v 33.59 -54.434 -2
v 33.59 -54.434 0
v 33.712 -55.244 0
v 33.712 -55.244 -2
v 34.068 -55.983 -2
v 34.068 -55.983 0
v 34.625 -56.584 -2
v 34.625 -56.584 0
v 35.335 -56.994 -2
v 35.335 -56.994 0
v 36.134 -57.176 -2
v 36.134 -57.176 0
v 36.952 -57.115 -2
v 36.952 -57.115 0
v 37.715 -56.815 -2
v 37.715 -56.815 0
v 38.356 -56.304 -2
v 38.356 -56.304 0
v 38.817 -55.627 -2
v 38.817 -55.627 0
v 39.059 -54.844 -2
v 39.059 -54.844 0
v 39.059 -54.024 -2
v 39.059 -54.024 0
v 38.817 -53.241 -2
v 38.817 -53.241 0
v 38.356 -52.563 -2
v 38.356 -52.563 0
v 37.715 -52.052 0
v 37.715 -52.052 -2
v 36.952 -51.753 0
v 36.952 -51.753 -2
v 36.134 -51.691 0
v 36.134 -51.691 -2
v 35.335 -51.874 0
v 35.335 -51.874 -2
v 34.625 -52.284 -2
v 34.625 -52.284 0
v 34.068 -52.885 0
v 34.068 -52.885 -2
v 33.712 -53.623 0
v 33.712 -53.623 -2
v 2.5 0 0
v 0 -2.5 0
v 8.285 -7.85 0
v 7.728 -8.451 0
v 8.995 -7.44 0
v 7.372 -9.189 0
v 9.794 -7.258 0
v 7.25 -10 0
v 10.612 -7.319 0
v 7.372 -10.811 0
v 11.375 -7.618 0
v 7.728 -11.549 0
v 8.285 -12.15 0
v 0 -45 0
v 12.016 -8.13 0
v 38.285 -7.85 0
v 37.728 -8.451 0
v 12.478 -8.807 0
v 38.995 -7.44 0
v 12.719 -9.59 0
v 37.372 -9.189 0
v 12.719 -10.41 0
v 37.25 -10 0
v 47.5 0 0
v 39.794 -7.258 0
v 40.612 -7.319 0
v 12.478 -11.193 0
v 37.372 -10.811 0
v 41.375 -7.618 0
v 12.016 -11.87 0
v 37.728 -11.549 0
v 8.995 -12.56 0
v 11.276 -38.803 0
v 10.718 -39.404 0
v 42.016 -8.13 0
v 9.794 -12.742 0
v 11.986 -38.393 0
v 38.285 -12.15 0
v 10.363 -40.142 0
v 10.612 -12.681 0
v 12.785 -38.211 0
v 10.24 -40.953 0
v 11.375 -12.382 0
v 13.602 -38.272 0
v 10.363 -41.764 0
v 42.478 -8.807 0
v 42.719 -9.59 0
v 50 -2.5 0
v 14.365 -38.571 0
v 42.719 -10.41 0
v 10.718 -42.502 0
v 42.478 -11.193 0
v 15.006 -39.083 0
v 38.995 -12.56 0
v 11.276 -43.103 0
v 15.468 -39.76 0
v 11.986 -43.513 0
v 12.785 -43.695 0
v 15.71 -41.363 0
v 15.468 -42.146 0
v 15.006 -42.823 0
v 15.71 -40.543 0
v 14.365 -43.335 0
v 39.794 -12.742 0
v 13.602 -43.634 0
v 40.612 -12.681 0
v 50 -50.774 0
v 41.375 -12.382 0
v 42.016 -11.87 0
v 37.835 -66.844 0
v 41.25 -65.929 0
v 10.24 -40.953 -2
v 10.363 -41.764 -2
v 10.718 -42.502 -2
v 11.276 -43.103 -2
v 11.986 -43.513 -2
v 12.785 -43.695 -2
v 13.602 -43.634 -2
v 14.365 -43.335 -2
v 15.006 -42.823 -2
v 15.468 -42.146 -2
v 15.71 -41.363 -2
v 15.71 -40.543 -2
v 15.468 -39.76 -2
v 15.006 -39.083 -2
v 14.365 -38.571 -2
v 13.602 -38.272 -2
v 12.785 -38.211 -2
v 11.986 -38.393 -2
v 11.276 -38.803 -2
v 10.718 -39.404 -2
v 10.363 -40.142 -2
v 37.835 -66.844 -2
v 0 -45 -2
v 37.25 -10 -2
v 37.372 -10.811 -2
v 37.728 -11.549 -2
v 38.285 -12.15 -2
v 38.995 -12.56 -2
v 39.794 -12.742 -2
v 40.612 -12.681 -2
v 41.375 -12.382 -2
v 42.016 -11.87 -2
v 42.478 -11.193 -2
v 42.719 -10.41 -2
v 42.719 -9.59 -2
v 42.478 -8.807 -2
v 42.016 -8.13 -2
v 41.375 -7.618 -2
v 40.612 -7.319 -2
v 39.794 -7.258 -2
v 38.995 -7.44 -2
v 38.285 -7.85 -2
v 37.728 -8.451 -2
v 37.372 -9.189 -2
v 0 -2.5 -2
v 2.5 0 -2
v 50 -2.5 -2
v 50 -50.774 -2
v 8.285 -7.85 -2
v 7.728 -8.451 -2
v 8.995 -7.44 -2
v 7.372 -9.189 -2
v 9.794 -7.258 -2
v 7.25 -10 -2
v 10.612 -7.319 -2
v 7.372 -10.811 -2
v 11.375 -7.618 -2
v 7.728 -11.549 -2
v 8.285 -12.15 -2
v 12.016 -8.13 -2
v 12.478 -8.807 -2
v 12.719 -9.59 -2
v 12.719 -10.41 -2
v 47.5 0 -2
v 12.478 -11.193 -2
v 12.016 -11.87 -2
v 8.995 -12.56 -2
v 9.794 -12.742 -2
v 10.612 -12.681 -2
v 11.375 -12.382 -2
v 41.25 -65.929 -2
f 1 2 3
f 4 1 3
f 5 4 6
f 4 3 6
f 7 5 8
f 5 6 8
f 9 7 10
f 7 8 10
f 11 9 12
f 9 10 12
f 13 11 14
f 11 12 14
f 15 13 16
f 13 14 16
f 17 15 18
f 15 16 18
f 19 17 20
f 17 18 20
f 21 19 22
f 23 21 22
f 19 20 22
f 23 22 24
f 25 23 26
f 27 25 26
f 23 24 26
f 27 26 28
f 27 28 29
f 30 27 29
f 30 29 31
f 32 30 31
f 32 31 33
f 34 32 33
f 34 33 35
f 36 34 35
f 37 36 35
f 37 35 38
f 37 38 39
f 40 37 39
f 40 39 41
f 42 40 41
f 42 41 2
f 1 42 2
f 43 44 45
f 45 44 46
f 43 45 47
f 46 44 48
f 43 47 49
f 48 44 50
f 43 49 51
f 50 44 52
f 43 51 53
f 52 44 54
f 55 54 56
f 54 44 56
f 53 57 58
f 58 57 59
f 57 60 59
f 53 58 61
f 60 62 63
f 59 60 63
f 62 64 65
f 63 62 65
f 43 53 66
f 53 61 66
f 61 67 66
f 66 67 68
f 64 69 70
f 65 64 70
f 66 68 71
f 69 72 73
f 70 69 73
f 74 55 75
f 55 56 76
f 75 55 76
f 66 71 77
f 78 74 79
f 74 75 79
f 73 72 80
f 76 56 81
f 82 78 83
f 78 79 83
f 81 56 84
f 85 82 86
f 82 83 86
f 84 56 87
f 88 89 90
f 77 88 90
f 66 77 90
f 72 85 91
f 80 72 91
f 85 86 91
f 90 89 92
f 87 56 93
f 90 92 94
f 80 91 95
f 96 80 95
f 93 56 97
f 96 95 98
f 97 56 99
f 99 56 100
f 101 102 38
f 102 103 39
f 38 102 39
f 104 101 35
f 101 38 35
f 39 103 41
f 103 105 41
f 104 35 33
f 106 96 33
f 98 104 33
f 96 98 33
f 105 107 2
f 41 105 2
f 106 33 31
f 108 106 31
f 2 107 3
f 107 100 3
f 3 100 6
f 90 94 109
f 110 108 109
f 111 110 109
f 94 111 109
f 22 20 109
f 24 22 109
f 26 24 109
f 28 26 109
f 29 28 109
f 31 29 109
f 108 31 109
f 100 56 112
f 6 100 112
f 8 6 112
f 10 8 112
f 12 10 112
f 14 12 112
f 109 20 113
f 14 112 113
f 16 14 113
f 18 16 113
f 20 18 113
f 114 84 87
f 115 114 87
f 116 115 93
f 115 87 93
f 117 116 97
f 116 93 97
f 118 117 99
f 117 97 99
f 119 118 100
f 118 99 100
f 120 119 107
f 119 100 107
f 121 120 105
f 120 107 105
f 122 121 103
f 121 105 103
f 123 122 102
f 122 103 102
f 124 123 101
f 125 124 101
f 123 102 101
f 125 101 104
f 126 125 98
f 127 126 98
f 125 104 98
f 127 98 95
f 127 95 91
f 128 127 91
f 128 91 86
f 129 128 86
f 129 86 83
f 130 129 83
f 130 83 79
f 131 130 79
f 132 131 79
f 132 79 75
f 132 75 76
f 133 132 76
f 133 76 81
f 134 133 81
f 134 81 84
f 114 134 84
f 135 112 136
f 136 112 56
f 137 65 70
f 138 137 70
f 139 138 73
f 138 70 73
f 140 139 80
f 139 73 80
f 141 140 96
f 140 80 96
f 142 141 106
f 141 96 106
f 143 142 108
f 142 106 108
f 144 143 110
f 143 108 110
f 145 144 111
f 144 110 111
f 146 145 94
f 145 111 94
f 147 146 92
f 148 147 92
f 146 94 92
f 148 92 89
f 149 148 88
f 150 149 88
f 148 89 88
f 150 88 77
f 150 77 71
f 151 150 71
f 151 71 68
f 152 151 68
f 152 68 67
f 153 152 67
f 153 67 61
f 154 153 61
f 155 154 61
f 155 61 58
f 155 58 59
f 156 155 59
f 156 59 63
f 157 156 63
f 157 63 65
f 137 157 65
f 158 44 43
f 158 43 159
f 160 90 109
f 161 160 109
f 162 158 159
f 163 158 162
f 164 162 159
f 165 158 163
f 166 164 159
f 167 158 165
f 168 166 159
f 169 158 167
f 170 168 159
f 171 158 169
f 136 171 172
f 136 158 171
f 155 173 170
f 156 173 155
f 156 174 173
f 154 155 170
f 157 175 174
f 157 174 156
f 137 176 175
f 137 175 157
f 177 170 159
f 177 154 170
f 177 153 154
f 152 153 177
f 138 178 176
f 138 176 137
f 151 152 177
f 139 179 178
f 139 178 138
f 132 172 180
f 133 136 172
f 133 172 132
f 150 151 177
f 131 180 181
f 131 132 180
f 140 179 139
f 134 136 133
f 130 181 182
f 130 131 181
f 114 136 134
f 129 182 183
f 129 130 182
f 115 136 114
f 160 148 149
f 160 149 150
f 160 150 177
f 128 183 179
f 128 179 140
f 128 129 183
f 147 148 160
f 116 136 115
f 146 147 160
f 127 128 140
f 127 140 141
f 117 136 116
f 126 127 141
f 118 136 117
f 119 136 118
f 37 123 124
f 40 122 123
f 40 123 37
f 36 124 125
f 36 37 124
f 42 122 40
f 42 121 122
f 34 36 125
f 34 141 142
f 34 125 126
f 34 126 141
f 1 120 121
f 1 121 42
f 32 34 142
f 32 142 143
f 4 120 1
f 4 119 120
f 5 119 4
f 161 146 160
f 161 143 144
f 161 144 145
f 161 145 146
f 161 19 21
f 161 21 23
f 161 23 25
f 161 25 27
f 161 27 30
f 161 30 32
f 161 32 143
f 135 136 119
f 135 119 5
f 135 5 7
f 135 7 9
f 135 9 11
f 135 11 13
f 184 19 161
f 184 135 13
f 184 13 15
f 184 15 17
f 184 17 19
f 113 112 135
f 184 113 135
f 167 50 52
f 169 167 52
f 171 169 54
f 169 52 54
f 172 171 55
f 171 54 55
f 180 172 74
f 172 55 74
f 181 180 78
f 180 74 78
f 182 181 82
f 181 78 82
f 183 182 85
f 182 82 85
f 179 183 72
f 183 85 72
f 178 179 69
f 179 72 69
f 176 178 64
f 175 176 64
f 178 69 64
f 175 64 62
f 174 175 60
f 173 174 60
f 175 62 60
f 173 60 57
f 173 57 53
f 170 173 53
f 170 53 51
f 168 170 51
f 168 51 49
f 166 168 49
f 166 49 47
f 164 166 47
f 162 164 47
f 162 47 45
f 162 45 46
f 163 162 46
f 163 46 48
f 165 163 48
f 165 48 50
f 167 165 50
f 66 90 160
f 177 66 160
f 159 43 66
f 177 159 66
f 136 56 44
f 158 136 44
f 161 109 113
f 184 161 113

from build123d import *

# Parameters (mm, degrees)
EXTRUDE_1_DEPTH   = 2
HOLE_WIZARD_M51_D = 5.5
CHAMFER_1_SIZE    = 2.5


with BuildPart() as part:
    # Эскиз3 → Бобышка-Вытянуть1 (new body)
    with BuildSketch(Plane(origin=(0, 0, 0), x_dir=(1, 0, 0), z_dir=(0, 0, -1))):
        Polygon((0, 0), (50, 0), (50, 50.773502692), (40, 68.094010768), (0, 45), align=None)
    extrude(amount=EXTRUDE_1_DEPTH)

    # Отверстие с зазором M51 (through all)
    with Locations(Plane(origin=(0, 0, -2), x_dir=(1, 0, 0), z_dir=(0, 0, -1))):
        with Locations((10, 10), (40, 10), (12.990381057, 40.952994616), (36.339745962, 54.43375673)):
            Hole(HOLE_WIZARD_M51_D / 2)

    # Фаска1
    chamfer_1_edges = [part.edges().sort_by_distance(p)[0] for p in [
        (40, -68.094010768, -1),
        (50, 0, -1),
        (0, 0, -1),
    ]]
    chamfer(chamfer_1_edges, length=CHAMFER_1_SIZE)


solid = part.part
